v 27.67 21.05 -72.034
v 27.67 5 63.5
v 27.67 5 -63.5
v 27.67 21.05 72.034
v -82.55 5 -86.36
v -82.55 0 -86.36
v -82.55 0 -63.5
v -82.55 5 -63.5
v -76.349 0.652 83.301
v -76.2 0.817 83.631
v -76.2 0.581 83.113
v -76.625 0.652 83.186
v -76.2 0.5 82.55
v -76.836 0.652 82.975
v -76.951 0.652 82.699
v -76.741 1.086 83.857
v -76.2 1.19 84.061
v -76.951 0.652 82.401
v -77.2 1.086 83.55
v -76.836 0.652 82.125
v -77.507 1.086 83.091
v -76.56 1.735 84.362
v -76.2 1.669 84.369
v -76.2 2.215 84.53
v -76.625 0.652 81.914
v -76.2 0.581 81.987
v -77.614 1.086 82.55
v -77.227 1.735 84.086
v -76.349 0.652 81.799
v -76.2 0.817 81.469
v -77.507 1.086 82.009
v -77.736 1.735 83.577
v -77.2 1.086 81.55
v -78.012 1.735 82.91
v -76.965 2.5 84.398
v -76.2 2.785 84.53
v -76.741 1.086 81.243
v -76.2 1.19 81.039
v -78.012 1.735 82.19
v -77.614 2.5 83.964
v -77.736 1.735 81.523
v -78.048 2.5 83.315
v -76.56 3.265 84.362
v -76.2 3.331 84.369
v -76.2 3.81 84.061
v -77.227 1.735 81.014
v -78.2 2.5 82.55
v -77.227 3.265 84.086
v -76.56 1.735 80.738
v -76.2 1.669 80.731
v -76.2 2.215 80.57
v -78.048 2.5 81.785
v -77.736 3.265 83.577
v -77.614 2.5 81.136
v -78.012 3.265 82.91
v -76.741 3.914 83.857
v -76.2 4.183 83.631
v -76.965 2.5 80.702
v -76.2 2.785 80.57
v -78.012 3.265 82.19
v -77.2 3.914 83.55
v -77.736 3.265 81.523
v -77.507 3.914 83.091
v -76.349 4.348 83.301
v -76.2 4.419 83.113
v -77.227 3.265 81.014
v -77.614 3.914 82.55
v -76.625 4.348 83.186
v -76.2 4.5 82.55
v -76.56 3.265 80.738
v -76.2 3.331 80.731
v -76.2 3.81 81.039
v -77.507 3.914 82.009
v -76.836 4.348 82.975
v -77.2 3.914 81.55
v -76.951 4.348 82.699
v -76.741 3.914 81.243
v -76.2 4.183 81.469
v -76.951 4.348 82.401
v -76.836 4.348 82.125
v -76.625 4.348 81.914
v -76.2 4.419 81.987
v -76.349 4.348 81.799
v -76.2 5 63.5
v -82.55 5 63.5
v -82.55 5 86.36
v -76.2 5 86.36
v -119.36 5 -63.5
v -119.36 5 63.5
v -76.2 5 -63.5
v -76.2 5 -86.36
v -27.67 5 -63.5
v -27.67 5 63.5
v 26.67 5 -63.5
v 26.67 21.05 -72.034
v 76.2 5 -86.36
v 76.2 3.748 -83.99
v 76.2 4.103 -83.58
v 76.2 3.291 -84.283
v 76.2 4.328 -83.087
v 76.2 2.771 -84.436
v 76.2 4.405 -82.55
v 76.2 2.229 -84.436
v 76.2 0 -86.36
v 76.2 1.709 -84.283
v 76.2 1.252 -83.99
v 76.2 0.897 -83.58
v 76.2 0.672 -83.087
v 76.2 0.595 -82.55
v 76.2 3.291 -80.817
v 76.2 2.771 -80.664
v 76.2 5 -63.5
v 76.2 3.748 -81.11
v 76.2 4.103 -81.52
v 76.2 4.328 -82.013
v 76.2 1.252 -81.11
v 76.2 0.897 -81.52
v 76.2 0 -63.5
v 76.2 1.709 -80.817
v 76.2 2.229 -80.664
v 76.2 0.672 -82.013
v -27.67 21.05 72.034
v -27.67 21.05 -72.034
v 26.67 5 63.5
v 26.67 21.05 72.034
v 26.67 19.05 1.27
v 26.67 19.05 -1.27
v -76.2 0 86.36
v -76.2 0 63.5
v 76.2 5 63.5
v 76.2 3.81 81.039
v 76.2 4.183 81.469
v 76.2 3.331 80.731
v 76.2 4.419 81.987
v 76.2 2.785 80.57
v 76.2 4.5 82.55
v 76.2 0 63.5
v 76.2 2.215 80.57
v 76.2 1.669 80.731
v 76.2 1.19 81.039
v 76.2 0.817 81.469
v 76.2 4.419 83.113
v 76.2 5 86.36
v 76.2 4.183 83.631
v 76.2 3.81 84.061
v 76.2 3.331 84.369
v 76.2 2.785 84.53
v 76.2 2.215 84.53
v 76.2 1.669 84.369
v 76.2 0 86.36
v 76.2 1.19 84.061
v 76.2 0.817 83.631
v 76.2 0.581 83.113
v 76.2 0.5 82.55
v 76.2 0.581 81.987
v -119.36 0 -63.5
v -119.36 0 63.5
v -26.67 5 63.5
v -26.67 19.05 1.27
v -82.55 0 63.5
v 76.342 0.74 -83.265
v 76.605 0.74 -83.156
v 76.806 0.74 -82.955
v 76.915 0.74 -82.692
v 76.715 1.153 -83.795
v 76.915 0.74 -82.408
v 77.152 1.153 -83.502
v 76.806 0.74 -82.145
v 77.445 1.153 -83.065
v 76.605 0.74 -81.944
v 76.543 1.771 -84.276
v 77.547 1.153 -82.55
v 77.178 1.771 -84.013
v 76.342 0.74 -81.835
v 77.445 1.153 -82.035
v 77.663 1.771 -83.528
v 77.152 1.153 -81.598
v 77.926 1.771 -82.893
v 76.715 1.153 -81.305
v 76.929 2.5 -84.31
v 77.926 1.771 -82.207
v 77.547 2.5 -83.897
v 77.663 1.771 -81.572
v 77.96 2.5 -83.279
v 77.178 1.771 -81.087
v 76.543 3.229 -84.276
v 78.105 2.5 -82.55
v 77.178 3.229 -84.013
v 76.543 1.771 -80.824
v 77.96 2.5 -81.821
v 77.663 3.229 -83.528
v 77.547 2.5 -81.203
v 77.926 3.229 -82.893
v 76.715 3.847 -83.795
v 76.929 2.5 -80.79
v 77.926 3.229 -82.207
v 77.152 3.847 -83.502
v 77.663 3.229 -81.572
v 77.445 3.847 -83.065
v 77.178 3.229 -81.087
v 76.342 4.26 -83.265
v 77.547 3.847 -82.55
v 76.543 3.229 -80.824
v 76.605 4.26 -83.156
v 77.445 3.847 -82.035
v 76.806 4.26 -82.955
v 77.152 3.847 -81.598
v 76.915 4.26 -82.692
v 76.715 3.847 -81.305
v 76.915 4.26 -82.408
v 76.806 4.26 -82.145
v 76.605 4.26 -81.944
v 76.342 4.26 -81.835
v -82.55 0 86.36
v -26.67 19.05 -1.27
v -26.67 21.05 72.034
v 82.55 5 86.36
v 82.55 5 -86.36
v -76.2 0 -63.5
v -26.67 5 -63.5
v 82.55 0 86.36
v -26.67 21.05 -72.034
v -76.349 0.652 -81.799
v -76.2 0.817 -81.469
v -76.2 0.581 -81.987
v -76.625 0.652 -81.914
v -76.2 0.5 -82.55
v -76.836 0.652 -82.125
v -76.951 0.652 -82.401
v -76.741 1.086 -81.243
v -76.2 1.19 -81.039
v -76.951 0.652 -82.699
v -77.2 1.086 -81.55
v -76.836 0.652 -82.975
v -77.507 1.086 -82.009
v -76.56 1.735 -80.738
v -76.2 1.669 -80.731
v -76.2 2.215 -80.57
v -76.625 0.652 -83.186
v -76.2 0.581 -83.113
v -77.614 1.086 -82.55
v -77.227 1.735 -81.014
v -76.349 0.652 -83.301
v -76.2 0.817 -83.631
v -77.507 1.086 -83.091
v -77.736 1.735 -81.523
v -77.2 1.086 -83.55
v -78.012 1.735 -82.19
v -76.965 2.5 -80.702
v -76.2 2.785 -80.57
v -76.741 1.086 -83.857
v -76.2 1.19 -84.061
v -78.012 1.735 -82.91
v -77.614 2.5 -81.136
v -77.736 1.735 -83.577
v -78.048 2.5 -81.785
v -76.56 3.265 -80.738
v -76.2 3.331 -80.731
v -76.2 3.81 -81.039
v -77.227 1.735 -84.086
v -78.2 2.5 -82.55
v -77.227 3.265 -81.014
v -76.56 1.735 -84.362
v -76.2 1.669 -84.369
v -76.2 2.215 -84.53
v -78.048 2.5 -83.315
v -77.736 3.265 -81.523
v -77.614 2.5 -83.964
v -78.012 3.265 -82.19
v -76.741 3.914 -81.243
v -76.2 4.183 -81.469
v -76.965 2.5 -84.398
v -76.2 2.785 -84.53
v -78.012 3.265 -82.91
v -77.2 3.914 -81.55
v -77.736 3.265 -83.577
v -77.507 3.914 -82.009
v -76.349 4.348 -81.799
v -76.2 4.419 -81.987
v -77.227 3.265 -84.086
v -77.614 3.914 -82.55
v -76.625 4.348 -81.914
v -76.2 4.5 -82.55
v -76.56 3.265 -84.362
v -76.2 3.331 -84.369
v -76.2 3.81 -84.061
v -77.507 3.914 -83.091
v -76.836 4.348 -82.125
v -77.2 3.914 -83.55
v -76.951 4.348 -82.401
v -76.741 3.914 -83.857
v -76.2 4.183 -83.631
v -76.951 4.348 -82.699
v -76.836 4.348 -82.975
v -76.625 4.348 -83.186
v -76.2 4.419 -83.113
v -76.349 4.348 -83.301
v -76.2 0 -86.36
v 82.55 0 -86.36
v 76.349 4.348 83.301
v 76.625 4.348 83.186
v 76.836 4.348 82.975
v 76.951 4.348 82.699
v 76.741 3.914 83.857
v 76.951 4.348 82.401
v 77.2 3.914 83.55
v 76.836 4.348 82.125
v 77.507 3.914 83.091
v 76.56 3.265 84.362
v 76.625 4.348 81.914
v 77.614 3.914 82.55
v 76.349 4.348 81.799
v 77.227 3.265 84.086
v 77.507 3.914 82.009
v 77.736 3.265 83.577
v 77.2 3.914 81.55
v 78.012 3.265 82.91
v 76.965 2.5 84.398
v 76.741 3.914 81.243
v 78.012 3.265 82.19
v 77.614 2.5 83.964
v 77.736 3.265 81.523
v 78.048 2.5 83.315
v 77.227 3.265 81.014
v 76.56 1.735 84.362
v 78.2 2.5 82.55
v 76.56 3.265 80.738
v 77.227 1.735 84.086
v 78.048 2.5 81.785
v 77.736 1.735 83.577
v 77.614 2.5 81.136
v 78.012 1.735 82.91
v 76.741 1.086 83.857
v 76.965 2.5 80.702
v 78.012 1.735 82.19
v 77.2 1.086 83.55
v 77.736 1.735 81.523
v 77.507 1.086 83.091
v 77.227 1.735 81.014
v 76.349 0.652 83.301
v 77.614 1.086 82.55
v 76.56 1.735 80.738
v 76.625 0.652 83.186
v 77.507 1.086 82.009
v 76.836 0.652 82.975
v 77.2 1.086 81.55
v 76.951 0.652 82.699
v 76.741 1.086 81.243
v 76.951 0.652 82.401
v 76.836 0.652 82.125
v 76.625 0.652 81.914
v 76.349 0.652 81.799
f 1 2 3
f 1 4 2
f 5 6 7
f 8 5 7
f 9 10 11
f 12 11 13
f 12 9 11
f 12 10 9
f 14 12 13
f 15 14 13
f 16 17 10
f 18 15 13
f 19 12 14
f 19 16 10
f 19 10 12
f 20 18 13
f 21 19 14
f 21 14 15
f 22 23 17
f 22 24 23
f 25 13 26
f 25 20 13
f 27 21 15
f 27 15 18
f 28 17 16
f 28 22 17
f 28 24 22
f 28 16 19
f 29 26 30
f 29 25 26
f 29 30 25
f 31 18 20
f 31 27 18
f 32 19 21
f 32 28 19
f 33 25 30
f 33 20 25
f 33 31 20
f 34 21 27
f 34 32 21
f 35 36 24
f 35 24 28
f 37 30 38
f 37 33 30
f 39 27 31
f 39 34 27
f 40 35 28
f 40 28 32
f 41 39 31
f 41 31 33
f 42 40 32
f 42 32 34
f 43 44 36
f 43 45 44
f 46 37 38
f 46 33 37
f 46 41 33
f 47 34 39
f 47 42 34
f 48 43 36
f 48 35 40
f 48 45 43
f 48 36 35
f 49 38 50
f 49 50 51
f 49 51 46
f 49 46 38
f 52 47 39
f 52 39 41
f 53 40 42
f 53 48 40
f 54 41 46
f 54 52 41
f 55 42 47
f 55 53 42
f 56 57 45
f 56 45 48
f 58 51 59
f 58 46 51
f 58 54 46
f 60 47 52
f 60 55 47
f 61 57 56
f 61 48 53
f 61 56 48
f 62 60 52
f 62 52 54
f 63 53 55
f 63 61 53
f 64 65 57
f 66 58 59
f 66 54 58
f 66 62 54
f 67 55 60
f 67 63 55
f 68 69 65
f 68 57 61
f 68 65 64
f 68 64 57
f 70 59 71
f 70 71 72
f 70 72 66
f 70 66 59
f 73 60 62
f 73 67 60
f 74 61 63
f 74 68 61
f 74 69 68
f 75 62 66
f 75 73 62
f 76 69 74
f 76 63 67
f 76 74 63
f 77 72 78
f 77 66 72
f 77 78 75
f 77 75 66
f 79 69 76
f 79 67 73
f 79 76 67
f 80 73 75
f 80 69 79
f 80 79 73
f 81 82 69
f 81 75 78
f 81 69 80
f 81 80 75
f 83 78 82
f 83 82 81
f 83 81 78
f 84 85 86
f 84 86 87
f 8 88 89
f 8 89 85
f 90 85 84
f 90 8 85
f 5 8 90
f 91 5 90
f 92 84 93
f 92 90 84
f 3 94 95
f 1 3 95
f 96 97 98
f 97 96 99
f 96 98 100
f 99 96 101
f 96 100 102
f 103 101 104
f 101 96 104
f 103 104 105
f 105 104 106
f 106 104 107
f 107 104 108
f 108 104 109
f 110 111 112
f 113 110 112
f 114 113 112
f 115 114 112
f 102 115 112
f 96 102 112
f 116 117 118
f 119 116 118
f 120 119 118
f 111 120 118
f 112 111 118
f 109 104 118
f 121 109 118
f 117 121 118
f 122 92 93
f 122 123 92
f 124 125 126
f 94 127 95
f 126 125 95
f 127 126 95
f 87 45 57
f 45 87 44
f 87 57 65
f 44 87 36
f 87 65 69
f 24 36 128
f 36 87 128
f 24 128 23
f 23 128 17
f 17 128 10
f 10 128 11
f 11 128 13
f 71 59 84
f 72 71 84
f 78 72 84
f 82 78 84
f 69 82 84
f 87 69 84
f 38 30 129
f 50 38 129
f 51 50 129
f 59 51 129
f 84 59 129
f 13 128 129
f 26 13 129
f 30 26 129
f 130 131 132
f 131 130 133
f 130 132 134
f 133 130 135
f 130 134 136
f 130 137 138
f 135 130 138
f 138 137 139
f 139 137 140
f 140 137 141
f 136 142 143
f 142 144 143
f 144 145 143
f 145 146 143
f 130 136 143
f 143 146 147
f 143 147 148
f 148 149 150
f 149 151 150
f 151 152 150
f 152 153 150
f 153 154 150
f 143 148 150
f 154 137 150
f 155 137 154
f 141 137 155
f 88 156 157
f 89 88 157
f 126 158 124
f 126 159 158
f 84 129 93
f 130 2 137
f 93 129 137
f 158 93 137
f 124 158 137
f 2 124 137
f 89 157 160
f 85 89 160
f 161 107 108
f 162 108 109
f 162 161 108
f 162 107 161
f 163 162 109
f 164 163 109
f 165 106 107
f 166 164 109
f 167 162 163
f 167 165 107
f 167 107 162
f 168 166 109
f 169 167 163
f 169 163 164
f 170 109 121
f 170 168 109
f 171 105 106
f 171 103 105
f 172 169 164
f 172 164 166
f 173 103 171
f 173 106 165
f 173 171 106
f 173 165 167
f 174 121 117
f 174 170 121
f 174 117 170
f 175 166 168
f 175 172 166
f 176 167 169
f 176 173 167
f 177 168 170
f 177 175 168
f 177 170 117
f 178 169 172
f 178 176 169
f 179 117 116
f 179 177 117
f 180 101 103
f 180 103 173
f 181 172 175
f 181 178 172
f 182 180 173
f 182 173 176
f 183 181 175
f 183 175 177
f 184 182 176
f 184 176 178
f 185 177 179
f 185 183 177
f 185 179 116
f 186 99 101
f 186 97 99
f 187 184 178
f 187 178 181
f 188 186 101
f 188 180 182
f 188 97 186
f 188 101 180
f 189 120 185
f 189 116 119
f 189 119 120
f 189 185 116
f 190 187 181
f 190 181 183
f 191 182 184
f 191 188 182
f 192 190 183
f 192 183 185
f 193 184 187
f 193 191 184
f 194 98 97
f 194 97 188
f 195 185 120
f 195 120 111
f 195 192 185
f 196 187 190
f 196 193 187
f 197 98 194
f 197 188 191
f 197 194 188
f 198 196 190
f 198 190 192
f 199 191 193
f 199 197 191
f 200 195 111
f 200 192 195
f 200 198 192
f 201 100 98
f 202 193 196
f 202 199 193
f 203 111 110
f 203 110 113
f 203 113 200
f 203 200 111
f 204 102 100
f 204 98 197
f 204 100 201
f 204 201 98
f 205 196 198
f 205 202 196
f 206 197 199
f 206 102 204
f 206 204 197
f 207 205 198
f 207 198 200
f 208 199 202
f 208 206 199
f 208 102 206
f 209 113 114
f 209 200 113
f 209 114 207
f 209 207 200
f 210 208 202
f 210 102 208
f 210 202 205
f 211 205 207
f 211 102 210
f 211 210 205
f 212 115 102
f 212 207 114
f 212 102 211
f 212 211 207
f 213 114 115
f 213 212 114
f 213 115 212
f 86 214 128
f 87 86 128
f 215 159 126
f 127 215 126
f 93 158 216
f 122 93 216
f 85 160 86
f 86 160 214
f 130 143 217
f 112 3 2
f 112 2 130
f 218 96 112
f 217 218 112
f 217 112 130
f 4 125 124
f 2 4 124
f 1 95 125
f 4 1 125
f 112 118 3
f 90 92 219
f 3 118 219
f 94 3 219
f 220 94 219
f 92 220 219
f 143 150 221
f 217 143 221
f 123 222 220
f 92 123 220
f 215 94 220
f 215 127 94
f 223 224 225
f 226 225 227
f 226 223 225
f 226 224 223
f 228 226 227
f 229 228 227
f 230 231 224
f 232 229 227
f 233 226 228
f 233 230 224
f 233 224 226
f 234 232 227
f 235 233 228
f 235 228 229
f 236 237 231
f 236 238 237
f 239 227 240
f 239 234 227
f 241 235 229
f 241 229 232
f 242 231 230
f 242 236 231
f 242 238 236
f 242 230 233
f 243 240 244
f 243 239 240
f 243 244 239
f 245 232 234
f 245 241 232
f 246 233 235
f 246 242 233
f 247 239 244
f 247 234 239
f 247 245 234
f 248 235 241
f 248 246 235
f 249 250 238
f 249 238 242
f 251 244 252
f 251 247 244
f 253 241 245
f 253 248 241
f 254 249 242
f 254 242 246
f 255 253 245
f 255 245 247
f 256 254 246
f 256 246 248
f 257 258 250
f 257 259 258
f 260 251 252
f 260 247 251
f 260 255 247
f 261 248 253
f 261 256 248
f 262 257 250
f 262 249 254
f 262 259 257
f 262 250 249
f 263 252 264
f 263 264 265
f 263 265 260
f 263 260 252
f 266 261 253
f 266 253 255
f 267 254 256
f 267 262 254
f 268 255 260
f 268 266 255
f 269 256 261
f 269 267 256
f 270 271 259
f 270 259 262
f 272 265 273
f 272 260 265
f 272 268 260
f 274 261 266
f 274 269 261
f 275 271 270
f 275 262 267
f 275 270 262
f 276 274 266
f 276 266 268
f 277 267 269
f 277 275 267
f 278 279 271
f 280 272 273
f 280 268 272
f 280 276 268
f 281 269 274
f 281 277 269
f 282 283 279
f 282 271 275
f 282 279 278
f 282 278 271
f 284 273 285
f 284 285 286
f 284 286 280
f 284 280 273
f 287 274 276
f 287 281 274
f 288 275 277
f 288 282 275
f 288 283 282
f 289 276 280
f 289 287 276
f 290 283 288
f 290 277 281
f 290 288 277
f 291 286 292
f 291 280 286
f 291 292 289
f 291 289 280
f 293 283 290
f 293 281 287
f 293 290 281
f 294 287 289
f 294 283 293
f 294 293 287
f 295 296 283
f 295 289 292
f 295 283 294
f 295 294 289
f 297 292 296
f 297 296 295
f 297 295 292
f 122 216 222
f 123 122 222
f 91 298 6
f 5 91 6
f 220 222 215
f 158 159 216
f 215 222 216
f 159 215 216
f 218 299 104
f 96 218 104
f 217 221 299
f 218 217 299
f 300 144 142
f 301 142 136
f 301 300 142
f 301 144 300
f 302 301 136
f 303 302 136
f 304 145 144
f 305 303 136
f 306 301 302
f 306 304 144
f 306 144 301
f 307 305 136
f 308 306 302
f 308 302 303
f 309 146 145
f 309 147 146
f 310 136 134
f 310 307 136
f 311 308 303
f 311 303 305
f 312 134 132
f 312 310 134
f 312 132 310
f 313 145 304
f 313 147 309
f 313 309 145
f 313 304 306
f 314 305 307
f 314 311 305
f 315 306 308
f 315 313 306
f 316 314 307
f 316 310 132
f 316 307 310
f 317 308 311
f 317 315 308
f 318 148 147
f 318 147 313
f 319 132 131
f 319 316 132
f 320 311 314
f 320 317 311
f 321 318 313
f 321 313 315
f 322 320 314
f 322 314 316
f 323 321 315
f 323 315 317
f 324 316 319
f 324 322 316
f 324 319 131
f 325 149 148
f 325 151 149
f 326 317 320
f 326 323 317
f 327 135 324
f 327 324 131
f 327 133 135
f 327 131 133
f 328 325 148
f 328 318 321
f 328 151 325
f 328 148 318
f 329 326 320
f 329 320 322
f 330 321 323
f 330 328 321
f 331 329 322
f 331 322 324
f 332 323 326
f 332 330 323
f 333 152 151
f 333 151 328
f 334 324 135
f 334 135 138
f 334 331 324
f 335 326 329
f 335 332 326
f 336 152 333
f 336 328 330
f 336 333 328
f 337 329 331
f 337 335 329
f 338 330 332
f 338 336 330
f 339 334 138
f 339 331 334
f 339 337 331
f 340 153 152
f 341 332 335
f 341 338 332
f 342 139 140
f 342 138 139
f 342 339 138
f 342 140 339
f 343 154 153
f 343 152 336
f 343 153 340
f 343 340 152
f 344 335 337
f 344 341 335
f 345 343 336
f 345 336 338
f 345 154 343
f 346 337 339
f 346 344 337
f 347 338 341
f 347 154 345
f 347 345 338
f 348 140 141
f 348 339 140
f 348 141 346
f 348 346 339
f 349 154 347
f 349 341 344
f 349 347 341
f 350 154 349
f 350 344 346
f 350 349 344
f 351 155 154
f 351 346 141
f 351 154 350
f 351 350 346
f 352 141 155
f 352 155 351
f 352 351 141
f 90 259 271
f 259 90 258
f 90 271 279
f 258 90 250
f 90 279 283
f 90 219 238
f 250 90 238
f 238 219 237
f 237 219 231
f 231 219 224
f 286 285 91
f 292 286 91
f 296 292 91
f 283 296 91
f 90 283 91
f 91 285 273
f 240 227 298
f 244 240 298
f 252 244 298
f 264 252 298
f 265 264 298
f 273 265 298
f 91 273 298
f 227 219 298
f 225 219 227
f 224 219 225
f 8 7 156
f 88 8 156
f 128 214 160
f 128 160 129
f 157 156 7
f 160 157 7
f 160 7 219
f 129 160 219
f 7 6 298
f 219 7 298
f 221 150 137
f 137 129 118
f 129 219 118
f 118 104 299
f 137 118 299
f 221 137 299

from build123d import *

# Parameters (mm, degrees)
BOSS_EXTRUDE1_DEPTH = 5
BOSS_EXTRUDE2_DEPTH = 1
BOSS_EXTRUDE3_DEPTH = 1


with BuildPart() as part:
    # Sketch1 → Boss-Extrude1 (new body)
    with BuildSketch(Plane(origin=(0, 0, 0), x_dir=(1, 0, 0), z_dir=(0, 1, 0))):
        Polygon((-82.55, -63.5), (-82.55, -86.36), (-76.2, -86.36), (-76.2, -63.5), (76.2, -63.5), (76.2, -86.36), (82.55, -86.36), (82.55, 86.36), (76.2, 86.36), (76.2, 63.5), (-76.2, 63.5), (-76.2, 86.36), (-82.55, 86.36), (-82.55, 63.5), (-119.360030459, 63.5), (-119.360030459, -63.5), align=None)
    extrude(amount=BOSS_EXTRUDE1_DEPTH)

    # Sketch4 → Cut-Revolve3 (revolve, cut)
    with BuildSketch(Plane(origin=(-76.2, 0, 0), x_dir=(0, 0, -1), z_dir=(1, 0, 0))):
        with BuildLine():
            Line((-82.55, 4.5), (-82.55, 0.5))
            ThreePointArc((-82.55, 0.5), (-80.55, 2.5), (-82.55, 4.5))
        make_face()
    revolve(axis=Axis((-76.2, 4.5, 82.55), (0, -1, 0)), mode=Mode.SUBTRACT)

    # Sketch5 → Cut-Revolve4 (revolve, cut)
    with BuildSketch(Plane.ZY.offset(-76.2)):
        with BuildLine():
            Line((82.55, 0.5), (82.55, 4.5))
            ThreePointArc((82.55, 4.5), (84.55, 2.5), (82.55, 0.5))
        make_face()
    revolve(axis=Axis((76.2, 0.5, 82.55), (0, 1, 0)), mode=Mode.SUBTRACT)

    # Sketch7 → Loft1 section 0
    with BuildSketch(Plane(origin=(0, 5, 0), x_dir=(1, 0, 0), z_dir=(0, 1, 0))):
        with BuildLine():
            Line((-26.67, -63.5), (26.67, -63.5))
            Line((26.67, -63.5), (26.67, 63.5))
            Line((26.67, 63.5), (-26.67, 63.5))
            Line((-26.67, 63.5), (-26.67, -63.5))
        make_face()
    # Sketch6 → Loft1 section 1
    with BuildSketch(Plane(origin=(0, 19.05, 0), x_dir=(1, 0, 0), z_dir=(0, 1, 0))):
        with BuildLine():
            Line((26.67, 1.27), (-26.67, 1.27))
            Line((-26.67, 1.27), (-26.67, -1.27))
            Line((-26.67, -1.27), (26.67, -1.27))
            Line((26.67, -1.27), (26.67, 1.27))
        make_face()
    loft()

    # Sketch8 → Cut-Revolve5 (revolve, cut)
    with BuildSketch(Plane(origin=(-76.2, 0, 0), x_dir=(0, 0, -1), z_dir=(1, 0, 0))):
        with BuildLine():
            Line((82.55, 4.5), (82.55, 0.5))
            ThreePointArc((82.55, 0.5), (84.55, 2.5), (82.55, 4.5))
        make_face()
    revolve(axis=Axis((-76.2, 4.5, -82.55), (0, -1, 0)), mode=Mode.SUBTRACT)

    # Sketch9 → Cut-Revolve6 (revolve, cut)
    with BuildSketch(Plane.ZY.offset(-76.2)):
        with BuildLine():
            Line((-82.55, 4.405), (-82.55, 0.595))
            ThreePointArc((-82.55, 0.595), (-80.645, 2.5), (-82.55, 4.405))
        make_face()
    revolve(axis=Axis((76.2, 4.405, -82.55), (0, -1, 0)), mode=Mode.SUBTRACT)

    # Sketch10 → Boss-Extrude2 (add)
    with BuildSketch(Plane(origin=(26.67, 0, 0), x_dir=(0, 0, -1), z_dir=(1, 0, 0))):
        Polygon((-63.5, 5), (63.5, 5), (72.033936378, 21.05), (-72.033936378, 21.05), align=None)
    extrude(amount=BOSS_EXTRUDE2_DEPTH)

    # Sketch11 → Boss-Extrude3 (add)
    with BuildSketch(Plane.ZY.offset(26.67)):
        Polygon((-63.5, 5), (63.5, 5), (72.033936378, 21.05), (-72.033936378, 21.05), align=None)
    extrude(amount=BOSS_EXTRUDE3_DEPTH)


solid = part.part
